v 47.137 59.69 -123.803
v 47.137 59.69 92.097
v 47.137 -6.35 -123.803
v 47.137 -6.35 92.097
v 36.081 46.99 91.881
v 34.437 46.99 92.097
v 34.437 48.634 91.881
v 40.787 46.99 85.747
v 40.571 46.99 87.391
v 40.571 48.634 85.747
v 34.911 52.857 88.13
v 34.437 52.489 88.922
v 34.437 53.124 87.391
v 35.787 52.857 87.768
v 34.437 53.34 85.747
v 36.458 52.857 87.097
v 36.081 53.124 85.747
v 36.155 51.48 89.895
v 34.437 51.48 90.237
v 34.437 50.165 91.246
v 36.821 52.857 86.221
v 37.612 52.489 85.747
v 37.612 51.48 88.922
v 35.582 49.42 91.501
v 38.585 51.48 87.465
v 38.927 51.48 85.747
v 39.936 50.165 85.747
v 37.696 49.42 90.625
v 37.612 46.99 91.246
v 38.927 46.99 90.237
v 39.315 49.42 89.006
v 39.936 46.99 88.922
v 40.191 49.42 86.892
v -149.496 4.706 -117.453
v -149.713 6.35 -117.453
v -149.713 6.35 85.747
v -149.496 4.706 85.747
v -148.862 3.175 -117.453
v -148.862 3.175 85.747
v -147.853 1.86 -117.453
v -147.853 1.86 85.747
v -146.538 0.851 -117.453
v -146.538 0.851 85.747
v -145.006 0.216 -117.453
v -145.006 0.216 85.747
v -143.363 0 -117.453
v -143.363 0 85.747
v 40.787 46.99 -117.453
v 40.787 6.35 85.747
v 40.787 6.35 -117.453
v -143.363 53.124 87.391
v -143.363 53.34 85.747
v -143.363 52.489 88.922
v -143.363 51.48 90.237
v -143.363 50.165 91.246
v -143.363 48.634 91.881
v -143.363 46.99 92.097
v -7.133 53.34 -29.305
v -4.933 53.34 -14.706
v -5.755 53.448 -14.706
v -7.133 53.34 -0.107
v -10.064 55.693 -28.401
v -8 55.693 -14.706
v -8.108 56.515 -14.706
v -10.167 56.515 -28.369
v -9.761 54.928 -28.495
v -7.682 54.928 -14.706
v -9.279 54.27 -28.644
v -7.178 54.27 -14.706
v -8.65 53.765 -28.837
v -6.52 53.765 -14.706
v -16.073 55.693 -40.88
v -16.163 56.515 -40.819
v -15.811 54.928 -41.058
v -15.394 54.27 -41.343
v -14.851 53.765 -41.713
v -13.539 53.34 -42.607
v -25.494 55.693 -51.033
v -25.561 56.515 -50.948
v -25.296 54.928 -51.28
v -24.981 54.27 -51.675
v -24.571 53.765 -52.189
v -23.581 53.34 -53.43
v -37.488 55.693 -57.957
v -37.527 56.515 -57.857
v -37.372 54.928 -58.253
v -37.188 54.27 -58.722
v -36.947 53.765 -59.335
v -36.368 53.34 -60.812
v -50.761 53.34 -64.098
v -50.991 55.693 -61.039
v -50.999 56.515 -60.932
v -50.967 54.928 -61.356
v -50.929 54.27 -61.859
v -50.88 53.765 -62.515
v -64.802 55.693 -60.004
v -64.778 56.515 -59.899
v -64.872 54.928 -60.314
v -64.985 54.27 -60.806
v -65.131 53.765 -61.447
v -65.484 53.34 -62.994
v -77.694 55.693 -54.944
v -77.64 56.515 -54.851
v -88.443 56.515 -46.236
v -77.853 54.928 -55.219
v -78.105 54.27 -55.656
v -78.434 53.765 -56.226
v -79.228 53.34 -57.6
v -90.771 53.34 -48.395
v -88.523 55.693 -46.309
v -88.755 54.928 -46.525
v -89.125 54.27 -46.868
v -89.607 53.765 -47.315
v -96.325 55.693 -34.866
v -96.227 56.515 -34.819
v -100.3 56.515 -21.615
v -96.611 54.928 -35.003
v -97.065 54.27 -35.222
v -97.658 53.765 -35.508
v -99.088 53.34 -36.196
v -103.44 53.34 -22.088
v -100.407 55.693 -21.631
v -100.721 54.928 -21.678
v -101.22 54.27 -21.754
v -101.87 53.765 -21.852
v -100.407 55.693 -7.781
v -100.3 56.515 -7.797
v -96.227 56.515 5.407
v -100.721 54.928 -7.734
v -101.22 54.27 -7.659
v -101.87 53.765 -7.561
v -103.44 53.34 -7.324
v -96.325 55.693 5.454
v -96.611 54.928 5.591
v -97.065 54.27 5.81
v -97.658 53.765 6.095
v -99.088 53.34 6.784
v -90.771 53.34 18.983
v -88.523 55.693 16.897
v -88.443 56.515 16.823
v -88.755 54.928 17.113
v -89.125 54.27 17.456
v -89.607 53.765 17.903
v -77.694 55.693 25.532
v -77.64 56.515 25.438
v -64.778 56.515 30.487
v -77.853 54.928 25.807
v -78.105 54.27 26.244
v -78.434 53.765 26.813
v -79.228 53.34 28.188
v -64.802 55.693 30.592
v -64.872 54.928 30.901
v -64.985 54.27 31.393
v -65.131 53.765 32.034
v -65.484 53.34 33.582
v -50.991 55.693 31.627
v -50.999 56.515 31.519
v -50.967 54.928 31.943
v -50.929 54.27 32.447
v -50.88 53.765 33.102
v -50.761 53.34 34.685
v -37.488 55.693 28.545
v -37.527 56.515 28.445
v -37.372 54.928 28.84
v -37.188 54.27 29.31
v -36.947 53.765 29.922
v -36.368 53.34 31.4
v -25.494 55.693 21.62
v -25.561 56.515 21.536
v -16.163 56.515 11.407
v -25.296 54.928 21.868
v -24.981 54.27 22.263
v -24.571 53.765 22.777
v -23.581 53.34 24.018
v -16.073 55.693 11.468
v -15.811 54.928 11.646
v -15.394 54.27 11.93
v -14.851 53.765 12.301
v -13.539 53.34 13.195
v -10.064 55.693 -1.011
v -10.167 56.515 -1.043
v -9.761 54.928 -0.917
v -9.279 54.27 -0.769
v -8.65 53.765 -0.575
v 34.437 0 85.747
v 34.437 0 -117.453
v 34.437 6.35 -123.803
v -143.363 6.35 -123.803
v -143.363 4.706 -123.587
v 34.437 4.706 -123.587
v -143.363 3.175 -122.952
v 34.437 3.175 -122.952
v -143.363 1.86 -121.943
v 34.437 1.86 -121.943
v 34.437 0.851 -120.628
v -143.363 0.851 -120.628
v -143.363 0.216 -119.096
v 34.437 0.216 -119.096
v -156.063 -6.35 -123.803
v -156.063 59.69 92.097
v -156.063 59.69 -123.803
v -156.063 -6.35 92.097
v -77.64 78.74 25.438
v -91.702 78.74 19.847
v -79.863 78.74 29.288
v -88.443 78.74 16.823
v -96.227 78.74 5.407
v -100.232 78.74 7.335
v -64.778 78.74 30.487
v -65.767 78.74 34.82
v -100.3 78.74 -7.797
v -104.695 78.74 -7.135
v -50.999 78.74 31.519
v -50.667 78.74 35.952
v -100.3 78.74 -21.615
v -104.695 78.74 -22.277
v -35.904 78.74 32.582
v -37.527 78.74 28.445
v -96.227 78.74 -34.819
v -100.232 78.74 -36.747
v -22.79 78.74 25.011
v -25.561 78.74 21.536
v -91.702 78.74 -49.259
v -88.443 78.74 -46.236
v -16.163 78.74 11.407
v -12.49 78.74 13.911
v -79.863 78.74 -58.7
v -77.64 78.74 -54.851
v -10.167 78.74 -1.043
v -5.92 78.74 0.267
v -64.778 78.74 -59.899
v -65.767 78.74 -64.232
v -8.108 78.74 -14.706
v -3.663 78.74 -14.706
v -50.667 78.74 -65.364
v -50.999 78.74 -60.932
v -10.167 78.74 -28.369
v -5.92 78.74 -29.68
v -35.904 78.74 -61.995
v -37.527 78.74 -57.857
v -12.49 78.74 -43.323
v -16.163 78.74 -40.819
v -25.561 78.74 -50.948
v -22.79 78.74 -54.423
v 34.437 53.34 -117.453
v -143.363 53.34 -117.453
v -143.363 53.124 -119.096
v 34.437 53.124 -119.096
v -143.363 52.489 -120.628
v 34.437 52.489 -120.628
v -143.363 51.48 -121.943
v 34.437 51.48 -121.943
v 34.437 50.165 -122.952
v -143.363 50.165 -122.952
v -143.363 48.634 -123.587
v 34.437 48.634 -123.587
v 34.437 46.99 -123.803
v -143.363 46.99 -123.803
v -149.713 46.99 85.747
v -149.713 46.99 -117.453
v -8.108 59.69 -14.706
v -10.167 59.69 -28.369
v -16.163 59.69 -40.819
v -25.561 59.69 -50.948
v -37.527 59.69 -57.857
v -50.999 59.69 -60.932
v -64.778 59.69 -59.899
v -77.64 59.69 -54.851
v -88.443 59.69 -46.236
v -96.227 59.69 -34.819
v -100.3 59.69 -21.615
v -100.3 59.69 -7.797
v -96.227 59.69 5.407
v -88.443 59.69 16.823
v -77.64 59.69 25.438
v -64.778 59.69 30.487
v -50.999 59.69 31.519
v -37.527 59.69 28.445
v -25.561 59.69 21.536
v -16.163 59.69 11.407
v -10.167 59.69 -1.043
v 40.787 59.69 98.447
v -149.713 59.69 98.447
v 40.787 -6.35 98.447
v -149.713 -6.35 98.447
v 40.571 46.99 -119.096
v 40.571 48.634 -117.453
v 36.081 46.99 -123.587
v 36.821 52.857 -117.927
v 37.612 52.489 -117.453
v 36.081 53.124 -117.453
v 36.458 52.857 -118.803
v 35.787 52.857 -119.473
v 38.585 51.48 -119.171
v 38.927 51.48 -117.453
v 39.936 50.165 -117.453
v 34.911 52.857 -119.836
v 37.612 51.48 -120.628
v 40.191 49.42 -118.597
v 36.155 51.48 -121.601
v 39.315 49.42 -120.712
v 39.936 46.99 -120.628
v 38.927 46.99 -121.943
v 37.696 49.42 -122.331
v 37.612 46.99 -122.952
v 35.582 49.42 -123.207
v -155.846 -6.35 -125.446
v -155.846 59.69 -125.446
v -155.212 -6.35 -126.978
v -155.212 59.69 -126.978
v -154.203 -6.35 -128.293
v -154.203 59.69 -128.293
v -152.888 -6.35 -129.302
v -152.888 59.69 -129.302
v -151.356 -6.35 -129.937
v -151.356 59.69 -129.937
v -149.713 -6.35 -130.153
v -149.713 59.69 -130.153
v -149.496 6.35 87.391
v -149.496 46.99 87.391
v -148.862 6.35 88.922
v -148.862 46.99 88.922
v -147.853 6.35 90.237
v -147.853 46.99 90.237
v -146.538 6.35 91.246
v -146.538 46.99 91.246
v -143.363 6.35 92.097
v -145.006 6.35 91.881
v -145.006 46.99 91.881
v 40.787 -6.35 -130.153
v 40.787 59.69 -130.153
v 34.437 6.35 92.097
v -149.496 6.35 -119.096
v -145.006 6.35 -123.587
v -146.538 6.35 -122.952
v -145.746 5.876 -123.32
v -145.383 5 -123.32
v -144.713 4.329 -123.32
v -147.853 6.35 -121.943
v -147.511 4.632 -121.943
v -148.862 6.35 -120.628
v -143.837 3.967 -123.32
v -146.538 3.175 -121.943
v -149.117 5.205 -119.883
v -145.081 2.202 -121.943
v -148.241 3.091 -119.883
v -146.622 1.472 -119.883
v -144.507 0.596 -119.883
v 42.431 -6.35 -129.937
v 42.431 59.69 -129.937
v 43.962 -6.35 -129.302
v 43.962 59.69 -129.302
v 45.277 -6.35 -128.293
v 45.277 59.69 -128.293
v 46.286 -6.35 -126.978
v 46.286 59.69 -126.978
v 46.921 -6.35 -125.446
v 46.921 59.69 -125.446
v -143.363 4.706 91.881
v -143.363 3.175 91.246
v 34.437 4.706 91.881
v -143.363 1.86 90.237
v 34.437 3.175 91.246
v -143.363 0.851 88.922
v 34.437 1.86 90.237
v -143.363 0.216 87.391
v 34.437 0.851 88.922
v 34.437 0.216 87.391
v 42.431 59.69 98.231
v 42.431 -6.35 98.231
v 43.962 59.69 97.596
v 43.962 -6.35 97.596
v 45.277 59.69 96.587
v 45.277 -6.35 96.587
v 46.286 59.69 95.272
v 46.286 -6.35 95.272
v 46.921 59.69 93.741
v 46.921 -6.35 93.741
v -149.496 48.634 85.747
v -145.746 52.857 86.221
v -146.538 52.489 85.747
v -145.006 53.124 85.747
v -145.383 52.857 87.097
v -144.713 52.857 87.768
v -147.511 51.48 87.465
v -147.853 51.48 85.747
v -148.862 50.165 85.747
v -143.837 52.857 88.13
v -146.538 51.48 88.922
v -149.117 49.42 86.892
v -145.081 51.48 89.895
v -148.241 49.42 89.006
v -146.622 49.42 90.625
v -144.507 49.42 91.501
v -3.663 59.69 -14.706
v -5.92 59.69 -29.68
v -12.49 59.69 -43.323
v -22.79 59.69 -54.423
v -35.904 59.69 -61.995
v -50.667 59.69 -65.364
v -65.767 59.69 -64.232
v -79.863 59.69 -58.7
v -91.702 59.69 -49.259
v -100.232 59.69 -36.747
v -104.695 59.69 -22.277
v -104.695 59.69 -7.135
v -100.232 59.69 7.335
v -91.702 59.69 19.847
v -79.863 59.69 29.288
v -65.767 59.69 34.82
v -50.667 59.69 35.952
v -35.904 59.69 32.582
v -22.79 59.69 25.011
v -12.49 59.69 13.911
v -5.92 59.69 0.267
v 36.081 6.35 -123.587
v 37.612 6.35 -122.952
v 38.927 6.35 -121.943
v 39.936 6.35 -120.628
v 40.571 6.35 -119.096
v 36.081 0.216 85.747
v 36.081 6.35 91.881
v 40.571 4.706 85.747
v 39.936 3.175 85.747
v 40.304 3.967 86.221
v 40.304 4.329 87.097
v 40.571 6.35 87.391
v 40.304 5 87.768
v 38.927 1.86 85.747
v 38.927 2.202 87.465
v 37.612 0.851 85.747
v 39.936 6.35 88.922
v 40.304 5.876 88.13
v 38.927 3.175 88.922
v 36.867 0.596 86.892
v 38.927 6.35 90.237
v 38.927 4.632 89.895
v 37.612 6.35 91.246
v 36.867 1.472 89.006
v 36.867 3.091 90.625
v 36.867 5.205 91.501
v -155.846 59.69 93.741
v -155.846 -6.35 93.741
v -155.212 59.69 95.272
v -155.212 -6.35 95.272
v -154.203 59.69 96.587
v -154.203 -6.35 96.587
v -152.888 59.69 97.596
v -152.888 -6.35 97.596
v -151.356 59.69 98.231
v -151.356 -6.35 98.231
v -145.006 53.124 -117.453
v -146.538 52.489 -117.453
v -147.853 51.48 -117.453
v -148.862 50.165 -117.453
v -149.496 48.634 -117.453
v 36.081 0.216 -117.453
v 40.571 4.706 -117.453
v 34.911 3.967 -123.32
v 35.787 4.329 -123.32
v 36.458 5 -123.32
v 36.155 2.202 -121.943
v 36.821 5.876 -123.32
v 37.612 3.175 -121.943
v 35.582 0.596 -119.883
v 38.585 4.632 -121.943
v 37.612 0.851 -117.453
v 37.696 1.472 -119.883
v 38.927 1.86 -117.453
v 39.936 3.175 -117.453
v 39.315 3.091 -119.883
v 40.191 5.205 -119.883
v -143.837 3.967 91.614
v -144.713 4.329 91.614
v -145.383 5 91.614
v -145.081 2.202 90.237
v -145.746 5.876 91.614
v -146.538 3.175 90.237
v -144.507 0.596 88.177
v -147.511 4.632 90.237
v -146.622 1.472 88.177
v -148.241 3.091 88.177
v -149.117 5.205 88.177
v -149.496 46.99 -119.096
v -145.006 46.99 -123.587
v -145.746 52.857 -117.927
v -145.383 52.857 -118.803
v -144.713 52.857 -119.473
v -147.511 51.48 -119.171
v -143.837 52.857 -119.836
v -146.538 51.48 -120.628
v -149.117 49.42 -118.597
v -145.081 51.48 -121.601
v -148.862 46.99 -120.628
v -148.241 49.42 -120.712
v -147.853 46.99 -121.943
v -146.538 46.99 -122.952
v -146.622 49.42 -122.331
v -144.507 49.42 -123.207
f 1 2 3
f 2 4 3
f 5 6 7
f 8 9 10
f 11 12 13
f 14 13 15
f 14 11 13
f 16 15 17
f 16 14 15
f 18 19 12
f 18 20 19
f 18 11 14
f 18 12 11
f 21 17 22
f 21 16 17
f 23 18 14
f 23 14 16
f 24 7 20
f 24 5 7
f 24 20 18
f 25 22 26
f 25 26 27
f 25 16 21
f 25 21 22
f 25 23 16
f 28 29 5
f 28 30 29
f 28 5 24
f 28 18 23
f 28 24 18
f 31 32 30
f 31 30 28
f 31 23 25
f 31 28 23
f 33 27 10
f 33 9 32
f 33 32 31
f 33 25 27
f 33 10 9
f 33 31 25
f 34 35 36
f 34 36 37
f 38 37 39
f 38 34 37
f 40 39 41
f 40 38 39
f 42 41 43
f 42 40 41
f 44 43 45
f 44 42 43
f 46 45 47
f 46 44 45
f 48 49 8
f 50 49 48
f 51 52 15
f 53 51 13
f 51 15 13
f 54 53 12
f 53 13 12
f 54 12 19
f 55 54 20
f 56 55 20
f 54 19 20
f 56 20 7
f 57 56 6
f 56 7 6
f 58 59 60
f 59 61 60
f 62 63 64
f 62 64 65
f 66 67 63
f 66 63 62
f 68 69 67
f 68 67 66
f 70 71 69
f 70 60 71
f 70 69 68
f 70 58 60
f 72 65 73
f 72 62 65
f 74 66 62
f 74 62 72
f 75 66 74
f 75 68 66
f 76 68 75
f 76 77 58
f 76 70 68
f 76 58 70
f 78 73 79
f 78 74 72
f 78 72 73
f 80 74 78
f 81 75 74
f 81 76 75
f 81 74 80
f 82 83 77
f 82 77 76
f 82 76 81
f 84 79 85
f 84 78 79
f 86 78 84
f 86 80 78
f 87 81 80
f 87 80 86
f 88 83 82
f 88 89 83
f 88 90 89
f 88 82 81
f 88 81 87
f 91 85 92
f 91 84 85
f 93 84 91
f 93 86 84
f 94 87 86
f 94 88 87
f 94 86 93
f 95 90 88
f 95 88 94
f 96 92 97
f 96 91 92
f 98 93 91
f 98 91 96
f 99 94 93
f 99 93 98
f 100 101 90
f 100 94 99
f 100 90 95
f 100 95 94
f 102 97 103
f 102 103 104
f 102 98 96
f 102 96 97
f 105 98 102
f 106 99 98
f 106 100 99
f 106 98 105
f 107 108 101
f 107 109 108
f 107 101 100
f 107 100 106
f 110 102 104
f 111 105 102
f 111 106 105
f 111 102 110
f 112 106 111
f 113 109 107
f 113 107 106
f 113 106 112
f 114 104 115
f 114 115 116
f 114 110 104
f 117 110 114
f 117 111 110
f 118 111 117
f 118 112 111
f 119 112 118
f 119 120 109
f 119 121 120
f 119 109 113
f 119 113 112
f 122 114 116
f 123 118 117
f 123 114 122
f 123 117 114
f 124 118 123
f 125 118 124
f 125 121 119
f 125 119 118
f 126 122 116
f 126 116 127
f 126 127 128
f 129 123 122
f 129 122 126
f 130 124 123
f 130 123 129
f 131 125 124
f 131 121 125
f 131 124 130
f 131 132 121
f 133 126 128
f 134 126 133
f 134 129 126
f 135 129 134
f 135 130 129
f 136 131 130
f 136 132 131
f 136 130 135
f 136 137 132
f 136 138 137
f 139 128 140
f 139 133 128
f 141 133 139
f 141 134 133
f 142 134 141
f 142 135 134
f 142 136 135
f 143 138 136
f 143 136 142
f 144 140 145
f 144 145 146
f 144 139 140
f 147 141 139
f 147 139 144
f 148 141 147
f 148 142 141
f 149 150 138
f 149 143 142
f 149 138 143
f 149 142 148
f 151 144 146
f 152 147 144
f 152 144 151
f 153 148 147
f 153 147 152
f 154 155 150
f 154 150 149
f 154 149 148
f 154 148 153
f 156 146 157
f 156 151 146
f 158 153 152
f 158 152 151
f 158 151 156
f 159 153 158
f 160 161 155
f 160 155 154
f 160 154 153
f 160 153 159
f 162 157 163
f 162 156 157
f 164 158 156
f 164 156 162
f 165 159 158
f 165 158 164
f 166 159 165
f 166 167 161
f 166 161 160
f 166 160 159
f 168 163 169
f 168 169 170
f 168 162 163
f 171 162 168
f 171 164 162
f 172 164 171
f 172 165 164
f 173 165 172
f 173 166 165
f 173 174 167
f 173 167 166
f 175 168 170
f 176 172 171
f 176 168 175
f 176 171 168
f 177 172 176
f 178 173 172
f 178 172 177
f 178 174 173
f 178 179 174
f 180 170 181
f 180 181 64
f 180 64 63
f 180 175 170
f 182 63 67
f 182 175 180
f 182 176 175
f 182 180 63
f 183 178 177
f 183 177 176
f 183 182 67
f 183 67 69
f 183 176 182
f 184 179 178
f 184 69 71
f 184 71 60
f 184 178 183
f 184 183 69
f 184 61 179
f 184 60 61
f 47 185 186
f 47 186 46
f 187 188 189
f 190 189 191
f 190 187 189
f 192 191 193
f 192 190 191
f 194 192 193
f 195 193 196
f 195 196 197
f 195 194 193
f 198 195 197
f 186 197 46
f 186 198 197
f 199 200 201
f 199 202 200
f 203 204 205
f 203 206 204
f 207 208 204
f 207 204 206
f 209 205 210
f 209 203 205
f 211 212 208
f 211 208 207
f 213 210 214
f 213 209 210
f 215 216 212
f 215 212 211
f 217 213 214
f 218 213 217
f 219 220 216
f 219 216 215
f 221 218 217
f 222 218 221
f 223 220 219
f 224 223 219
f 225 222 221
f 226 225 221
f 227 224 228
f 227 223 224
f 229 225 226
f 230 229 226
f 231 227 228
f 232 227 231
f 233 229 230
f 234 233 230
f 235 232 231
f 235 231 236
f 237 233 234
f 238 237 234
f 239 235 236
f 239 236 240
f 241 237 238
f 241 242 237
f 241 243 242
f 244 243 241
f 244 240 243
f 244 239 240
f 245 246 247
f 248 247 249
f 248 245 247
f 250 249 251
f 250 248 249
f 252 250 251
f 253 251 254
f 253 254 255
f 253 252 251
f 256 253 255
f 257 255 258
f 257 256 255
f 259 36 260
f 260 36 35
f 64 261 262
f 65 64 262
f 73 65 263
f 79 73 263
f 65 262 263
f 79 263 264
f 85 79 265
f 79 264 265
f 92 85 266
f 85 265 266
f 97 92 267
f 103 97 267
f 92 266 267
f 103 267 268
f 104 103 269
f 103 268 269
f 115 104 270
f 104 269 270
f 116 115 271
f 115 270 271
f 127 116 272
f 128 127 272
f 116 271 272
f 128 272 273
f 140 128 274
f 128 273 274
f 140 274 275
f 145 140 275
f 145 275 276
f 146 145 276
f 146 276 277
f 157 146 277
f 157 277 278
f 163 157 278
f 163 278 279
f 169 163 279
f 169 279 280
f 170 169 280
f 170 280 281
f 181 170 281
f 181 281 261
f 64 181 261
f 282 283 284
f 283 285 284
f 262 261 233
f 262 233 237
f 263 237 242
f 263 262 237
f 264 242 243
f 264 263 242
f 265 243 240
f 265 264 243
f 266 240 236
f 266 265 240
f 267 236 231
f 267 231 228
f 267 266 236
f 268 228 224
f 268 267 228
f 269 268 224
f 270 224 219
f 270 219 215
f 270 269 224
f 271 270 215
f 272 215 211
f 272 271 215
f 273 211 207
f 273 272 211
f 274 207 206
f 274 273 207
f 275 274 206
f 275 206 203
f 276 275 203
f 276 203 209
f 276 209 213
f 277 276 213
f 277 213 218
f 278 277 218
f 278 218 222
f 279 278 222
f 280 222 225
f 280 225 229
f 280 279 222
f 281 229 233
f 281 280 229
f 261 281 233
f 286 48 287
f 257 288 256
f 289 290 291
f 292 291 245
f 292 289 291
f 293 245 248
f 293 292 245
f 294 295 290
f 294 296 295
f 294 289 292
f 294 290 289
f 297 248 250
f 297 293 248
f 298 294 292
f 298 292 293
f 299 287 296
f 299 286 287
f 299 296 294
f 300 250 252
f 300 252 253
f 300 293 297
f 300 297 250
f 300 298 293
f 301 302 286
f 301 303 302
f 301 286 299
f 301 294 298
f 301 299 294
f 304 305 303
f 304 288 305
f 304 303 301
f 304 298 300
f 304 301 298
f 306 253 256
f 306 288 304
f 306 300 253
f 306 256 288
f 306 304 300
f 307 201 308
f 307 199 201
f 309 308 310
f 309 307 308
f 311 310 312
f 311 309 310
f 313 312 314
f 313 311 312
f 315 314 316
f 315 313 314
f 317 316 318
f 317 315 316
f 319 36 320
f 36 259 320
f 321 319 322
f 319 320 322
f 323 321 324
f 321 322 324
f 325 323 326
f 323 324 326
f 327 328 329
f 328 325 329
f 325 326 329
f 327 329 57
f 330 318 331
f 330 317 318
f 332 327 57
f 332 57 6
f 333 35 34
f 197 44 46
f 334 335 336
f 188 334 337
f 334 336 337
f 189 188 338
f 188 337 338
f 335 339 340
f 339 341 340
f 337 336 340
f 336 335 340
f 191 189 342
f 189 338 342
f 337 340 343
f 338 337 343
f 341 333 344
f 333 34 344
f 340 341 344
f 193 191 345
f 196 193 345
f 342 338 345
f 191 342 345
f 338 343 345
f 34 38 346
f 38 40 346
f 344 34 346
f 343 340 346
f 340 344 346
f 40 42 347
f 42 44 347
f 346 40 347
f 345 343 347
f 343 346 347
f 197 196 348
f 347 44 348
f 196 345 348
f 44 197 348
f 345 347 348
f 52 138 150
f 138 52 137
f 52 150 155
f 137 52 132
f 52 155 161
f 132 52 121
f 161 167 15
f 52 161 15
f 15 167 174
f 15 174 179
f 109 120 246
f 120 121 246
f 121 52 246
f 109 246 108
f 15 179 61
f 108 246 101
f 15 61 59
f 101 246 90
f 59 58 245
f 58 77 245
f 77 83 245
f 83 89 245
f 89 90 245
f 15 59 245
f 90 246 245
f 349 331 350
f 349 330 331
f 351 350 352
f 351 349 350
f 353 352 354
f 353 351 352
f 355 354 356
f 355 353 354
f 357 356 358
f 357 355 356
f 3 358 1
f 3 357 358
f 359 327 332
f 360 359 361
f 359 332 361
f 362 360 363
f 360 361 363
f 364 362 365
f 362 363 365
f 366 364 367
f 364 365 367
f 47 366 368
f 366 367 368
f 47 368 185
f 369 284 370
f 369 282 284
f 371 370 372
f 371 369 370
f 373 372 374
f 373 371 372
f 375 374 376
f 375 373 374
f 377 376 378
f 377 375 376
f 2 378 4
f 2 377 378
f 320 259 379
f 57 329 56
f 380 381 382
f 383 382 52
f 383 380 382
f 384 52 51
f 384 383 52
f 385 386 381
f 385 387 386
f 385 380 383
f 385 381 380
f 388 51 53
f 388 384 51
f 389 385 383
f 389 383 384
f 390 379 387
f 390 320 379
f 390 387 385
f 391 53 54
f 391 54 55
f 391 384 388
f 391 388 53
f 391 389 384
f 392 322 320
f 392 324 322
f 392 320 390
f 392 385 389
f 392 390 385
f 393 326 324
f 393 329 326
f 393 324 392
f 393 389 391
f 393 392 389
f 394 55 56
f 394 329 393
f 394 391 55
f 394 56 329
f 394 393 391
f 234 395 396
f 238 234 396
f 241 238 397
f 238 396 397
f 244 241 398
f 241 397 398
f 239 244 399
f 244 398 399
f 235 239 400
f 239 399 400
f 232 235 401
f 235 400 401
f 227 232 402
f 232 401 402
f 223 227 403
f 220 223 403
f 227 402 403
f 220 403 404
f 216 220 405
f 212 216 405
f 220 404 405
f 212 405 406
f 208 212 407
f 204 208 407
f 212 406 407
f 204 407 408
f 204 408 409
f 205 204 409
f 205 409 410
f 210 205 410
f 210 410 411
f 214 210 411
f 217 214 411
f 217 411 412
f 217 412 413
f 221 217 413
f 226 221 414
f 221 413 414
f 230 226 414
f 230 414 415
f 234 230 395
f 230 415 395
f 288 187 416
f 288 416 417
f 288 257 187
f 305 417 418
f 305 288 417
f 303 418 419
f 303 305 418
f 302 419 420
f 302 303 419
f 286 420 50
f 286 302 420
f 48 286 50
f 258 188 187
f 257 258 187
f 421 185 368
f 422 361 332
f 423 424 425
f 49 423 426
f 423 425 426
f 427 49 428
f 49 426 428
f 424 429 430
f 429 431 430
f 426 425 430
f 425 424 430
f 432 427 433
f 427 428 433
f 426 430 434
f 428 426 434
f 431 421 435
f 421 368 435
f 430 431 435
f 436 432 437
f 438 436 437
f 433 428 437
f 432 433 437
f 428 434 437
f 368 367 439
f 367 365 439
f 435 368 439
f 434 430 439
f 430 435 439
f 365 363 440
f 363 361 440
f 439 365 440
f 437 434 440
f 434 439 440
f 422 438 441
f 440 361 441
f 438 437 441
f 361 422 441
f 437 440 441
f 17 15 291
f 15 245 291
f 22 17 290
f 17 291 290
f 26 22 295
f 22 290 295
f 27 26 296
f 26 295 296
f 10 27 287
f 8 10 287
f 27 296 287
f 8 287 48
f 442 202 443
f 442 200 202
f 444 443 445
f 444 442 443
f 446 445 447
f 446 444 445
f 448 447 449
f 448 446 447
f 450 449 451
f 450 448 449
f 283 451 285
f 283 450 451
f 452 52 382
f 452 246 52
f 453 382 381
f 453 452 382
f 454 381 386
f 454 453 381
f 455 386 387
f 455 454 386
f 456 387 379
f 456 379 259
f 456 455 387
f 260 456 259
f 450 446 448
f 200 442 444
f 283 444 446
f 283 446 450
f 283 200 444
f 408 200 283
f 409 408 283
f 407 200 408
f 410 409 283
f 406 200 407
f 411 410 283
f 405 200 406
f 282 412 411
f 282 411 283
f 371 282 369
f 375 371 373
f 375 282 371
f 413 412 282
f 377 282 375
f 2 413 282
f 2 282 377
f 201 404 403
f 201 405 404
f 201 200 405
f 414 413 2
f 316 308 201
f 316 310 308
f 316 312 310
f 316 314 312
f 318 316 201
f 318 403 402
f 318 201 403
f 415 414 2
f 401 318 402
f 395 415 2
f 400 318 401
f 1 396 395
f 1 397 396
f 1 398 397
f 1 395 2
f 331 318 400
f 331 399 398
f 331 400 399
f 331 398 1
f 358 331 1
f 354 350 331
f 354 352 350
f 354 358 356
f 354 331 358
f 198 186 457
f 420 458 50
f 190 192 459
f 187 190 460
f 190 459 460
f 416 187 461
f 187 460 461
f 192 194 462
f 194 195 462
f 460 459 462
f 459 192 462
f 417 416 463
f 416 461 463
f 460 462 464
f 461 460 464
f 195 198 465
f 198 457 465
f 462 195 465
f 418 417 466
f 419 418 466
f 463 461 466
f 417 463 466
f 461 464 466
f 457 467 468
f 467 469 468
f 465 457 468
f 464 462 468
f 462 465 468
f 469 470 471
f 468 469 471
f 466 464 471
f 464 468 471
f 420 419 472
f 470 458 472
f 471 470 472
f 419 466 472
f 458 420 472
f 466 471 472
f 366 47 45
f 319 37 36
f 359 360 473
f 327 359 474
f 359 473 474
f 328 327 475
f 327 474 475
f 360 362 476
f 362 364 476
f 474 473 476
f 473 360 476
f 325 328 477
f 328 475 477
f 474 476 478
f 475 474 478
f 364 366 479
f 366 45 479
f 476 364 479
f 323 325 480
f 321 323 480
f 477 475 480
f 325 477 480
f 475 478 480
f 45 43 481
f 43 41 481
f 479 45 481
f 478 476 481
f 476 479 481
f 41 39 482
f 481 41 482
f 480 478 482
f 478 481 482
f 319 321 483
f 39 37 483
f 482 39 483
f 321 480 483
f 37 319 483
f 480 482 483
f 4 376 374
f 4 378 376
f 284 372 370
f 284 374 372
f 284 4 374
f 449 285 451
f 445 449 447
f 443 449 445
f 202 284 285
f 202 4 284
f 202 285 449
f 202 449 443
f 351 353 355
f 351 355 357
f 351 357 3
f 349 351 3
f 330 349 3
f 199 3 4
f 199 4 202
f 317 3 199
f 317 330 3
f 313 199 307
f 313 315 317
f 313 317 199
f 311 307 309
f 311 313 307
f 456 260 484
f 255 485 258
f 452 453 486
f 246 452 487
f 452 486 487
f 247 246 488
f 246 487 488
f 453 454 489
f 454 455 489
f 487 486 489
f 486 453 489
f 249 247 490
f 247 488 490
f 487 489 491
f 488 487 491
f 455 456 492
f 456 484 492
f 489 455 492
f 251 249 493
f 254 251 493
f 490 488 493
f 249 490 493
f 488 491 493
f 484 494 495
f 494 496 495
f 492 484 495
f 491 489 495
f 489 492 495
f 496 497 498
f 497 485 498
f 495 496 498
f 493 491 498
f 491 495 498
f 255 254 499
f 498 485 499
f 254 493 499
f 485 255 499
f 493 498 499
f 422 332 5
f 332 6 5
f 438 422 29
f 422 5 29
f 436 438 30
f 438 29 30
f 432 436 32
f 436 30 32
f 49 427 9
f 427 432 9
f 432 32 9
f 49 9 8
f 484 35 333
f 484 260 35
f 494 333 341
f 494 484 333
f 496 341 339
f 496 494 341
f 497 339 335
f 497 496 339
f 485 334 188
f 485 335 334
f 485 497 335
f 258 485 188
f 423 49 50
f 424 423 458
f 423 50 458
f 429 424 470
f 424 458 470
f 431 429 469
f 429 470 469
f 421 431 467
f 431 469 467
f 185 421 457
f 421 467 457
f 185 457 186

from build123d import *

# Parameters (mm, degrees)
SKETCH1_W           = 203.2
SKETCH1_H           = 228.6
SKETCH1_W_2         = 190.5
SKETCH1_H_2         = 215.9
BOSS_EXTRUDE1_DEPTH = 53.34
SKETCH2_W           = 203.2
SKETCH2_H           = 228.6
BOSS_EXTRUDE2_DEPTH = 6.35
SKETCH3_W           = 203.2
SKETCH3_H           = 228.6
BOSS_EXTRUDE3_DEPTH = 6.35
CUT_EXTRUDE1_REACH  = 68.04
SKETCH5_R           = 46.355
FILLET5_R           = 6.35
SKETCH6_R           = 50.8
SKETCH6_R_2         = 46.355
BOSS_EXTRUDE4_DEPTH = 19.05
FILLET6_R           = 3.175


with BuildPart() as part:
    # Sketch1 → Boss-Extrude1 (new body)
    with BuildSketch(Plane(origin=(0, 0, 0), x_dir=(1, 0, 0), z_dir=(0, 1, 0))):
        with Locations((-54.462846348, 15.85288386)):
            Rectangle(SKETCH1_W, SKETCH1_H)
        with Locations((-54.462846348, 15.85288386)):
            Rectangle(SKETCH1_W_2, SKETCH1_H_2, mode=Mode.SUBTRACT)
    extrude(amount=BOSS_EXTRUDE1_DEPTH)

    # Sketch2 → Boss-Extrude2 (add)
    with BuildSketch(Plane(origin=(0, 0, 0), x_dir=(-1, 0, 0), z_dir=(0, -1, 0))):
        with Locations((54.462846348, 15.85288386)):
            Rectangle(SKETCH2_W, SKETCH2_H)
    extrude(amount=BOSS_EXTRUDE2_DEPTH)

    # Sketch3 → Boss-Extrude3 (add)
    with BuildSketch(Plane(origin=(0, 53.34, 0), x_dir=(1, 0, 0), z_dir=(0, 1, 0))):
        with Locations((-54.462846348, 15.85288386)):
            Rectangle(SKETCH3_W, SKETCH3_H)
    extrude(amount=BOSS_EXTRUDE3_DEPTH)

    # Sketch5 → Cut-Extrude1 (cut, up to next)
    with BuildSketch(Plane(origin=(0, 59.69, 0), x_dir=(1, 0, 0), z_dir=(0, 1, 0)), mode=Mode.PRIVATE) as cut_extrude1_sk1:
        with Locations((-54.462846348, 14.706120018)):
            Circle(SKETCH5_R)
    cut_extrude1_tool1 = extrude(cut_extrude1_sk1.sketch, amount=-CUT_EXTRUDE1_REACH, mode=Mode.PRIVATE) & part.part
    add(cut_extrude1_tool1.solids().sort_by_distance((-54.462846, 59.69, -14.70612))[0], mode=Mode.SUBTRACT)

    # Fillet5
    fillet5_edges = [part.edges().sort_by_distance(p)[0] for p in [
        (-149.712846348, 0, -15.85288386),
        (-149.712846348, 26.67, -123.80288386),
        (-54.462846348, 0, 92.09711614),
        (-149.712846348, 26.67, 92.09711614),
        (40.787153652, 0, -15.85288386),
        (40.787153652, 26.67, 92.09711614),
        (-54.462846348, 0, -123.80288386),
        (40.787153652, 26.67, -123.80288386),
        (-149.712846348, 53.34, -15.85288386),
        (-54.462846348, 53.34, 92.09711614),
        (40.787153652, 53.34, -15.85288386),
        (-54.462846348, 53.34, -123.80288386),
        (-156.062846348, 26.67, -130.15288386),
        (47.137153652, 26.67, -130.15288386),
        (47.137153652, 26.67, 98.44711614),
        (-156.062846348, 26.67, 98.44711614),
    ]]
    fillet(fillet5_edges, radius=FILLET5_R)

    # Sketch6 → Boss-Extrude4 (add)
    with BuildSketch(Plane(origin=(0, 59.69, 0), x_dir=(1, 0, 0), z_dir=(0, 1, 0))):
        with Locations((-54.462846348, 14.706120018)):
            Circle(SKETCH6_R)
        with Locations((-54.462846348, 14.706120018)):
            Circle(SKETCH6_R_2, mode=Mode.SUBTRACT)
    extrude(amount=BOSS_EXTRUDE4_DEPTH)

    # Fillet6
    fillet6_edges = [part.edges().sort_by_distance(p)[0] for p in [
        (-100.817846348, 53.34, -14.706120018),
    ]]
    fillet(fillet6_edges, radius=FILLET6_R)


solid = part.part
